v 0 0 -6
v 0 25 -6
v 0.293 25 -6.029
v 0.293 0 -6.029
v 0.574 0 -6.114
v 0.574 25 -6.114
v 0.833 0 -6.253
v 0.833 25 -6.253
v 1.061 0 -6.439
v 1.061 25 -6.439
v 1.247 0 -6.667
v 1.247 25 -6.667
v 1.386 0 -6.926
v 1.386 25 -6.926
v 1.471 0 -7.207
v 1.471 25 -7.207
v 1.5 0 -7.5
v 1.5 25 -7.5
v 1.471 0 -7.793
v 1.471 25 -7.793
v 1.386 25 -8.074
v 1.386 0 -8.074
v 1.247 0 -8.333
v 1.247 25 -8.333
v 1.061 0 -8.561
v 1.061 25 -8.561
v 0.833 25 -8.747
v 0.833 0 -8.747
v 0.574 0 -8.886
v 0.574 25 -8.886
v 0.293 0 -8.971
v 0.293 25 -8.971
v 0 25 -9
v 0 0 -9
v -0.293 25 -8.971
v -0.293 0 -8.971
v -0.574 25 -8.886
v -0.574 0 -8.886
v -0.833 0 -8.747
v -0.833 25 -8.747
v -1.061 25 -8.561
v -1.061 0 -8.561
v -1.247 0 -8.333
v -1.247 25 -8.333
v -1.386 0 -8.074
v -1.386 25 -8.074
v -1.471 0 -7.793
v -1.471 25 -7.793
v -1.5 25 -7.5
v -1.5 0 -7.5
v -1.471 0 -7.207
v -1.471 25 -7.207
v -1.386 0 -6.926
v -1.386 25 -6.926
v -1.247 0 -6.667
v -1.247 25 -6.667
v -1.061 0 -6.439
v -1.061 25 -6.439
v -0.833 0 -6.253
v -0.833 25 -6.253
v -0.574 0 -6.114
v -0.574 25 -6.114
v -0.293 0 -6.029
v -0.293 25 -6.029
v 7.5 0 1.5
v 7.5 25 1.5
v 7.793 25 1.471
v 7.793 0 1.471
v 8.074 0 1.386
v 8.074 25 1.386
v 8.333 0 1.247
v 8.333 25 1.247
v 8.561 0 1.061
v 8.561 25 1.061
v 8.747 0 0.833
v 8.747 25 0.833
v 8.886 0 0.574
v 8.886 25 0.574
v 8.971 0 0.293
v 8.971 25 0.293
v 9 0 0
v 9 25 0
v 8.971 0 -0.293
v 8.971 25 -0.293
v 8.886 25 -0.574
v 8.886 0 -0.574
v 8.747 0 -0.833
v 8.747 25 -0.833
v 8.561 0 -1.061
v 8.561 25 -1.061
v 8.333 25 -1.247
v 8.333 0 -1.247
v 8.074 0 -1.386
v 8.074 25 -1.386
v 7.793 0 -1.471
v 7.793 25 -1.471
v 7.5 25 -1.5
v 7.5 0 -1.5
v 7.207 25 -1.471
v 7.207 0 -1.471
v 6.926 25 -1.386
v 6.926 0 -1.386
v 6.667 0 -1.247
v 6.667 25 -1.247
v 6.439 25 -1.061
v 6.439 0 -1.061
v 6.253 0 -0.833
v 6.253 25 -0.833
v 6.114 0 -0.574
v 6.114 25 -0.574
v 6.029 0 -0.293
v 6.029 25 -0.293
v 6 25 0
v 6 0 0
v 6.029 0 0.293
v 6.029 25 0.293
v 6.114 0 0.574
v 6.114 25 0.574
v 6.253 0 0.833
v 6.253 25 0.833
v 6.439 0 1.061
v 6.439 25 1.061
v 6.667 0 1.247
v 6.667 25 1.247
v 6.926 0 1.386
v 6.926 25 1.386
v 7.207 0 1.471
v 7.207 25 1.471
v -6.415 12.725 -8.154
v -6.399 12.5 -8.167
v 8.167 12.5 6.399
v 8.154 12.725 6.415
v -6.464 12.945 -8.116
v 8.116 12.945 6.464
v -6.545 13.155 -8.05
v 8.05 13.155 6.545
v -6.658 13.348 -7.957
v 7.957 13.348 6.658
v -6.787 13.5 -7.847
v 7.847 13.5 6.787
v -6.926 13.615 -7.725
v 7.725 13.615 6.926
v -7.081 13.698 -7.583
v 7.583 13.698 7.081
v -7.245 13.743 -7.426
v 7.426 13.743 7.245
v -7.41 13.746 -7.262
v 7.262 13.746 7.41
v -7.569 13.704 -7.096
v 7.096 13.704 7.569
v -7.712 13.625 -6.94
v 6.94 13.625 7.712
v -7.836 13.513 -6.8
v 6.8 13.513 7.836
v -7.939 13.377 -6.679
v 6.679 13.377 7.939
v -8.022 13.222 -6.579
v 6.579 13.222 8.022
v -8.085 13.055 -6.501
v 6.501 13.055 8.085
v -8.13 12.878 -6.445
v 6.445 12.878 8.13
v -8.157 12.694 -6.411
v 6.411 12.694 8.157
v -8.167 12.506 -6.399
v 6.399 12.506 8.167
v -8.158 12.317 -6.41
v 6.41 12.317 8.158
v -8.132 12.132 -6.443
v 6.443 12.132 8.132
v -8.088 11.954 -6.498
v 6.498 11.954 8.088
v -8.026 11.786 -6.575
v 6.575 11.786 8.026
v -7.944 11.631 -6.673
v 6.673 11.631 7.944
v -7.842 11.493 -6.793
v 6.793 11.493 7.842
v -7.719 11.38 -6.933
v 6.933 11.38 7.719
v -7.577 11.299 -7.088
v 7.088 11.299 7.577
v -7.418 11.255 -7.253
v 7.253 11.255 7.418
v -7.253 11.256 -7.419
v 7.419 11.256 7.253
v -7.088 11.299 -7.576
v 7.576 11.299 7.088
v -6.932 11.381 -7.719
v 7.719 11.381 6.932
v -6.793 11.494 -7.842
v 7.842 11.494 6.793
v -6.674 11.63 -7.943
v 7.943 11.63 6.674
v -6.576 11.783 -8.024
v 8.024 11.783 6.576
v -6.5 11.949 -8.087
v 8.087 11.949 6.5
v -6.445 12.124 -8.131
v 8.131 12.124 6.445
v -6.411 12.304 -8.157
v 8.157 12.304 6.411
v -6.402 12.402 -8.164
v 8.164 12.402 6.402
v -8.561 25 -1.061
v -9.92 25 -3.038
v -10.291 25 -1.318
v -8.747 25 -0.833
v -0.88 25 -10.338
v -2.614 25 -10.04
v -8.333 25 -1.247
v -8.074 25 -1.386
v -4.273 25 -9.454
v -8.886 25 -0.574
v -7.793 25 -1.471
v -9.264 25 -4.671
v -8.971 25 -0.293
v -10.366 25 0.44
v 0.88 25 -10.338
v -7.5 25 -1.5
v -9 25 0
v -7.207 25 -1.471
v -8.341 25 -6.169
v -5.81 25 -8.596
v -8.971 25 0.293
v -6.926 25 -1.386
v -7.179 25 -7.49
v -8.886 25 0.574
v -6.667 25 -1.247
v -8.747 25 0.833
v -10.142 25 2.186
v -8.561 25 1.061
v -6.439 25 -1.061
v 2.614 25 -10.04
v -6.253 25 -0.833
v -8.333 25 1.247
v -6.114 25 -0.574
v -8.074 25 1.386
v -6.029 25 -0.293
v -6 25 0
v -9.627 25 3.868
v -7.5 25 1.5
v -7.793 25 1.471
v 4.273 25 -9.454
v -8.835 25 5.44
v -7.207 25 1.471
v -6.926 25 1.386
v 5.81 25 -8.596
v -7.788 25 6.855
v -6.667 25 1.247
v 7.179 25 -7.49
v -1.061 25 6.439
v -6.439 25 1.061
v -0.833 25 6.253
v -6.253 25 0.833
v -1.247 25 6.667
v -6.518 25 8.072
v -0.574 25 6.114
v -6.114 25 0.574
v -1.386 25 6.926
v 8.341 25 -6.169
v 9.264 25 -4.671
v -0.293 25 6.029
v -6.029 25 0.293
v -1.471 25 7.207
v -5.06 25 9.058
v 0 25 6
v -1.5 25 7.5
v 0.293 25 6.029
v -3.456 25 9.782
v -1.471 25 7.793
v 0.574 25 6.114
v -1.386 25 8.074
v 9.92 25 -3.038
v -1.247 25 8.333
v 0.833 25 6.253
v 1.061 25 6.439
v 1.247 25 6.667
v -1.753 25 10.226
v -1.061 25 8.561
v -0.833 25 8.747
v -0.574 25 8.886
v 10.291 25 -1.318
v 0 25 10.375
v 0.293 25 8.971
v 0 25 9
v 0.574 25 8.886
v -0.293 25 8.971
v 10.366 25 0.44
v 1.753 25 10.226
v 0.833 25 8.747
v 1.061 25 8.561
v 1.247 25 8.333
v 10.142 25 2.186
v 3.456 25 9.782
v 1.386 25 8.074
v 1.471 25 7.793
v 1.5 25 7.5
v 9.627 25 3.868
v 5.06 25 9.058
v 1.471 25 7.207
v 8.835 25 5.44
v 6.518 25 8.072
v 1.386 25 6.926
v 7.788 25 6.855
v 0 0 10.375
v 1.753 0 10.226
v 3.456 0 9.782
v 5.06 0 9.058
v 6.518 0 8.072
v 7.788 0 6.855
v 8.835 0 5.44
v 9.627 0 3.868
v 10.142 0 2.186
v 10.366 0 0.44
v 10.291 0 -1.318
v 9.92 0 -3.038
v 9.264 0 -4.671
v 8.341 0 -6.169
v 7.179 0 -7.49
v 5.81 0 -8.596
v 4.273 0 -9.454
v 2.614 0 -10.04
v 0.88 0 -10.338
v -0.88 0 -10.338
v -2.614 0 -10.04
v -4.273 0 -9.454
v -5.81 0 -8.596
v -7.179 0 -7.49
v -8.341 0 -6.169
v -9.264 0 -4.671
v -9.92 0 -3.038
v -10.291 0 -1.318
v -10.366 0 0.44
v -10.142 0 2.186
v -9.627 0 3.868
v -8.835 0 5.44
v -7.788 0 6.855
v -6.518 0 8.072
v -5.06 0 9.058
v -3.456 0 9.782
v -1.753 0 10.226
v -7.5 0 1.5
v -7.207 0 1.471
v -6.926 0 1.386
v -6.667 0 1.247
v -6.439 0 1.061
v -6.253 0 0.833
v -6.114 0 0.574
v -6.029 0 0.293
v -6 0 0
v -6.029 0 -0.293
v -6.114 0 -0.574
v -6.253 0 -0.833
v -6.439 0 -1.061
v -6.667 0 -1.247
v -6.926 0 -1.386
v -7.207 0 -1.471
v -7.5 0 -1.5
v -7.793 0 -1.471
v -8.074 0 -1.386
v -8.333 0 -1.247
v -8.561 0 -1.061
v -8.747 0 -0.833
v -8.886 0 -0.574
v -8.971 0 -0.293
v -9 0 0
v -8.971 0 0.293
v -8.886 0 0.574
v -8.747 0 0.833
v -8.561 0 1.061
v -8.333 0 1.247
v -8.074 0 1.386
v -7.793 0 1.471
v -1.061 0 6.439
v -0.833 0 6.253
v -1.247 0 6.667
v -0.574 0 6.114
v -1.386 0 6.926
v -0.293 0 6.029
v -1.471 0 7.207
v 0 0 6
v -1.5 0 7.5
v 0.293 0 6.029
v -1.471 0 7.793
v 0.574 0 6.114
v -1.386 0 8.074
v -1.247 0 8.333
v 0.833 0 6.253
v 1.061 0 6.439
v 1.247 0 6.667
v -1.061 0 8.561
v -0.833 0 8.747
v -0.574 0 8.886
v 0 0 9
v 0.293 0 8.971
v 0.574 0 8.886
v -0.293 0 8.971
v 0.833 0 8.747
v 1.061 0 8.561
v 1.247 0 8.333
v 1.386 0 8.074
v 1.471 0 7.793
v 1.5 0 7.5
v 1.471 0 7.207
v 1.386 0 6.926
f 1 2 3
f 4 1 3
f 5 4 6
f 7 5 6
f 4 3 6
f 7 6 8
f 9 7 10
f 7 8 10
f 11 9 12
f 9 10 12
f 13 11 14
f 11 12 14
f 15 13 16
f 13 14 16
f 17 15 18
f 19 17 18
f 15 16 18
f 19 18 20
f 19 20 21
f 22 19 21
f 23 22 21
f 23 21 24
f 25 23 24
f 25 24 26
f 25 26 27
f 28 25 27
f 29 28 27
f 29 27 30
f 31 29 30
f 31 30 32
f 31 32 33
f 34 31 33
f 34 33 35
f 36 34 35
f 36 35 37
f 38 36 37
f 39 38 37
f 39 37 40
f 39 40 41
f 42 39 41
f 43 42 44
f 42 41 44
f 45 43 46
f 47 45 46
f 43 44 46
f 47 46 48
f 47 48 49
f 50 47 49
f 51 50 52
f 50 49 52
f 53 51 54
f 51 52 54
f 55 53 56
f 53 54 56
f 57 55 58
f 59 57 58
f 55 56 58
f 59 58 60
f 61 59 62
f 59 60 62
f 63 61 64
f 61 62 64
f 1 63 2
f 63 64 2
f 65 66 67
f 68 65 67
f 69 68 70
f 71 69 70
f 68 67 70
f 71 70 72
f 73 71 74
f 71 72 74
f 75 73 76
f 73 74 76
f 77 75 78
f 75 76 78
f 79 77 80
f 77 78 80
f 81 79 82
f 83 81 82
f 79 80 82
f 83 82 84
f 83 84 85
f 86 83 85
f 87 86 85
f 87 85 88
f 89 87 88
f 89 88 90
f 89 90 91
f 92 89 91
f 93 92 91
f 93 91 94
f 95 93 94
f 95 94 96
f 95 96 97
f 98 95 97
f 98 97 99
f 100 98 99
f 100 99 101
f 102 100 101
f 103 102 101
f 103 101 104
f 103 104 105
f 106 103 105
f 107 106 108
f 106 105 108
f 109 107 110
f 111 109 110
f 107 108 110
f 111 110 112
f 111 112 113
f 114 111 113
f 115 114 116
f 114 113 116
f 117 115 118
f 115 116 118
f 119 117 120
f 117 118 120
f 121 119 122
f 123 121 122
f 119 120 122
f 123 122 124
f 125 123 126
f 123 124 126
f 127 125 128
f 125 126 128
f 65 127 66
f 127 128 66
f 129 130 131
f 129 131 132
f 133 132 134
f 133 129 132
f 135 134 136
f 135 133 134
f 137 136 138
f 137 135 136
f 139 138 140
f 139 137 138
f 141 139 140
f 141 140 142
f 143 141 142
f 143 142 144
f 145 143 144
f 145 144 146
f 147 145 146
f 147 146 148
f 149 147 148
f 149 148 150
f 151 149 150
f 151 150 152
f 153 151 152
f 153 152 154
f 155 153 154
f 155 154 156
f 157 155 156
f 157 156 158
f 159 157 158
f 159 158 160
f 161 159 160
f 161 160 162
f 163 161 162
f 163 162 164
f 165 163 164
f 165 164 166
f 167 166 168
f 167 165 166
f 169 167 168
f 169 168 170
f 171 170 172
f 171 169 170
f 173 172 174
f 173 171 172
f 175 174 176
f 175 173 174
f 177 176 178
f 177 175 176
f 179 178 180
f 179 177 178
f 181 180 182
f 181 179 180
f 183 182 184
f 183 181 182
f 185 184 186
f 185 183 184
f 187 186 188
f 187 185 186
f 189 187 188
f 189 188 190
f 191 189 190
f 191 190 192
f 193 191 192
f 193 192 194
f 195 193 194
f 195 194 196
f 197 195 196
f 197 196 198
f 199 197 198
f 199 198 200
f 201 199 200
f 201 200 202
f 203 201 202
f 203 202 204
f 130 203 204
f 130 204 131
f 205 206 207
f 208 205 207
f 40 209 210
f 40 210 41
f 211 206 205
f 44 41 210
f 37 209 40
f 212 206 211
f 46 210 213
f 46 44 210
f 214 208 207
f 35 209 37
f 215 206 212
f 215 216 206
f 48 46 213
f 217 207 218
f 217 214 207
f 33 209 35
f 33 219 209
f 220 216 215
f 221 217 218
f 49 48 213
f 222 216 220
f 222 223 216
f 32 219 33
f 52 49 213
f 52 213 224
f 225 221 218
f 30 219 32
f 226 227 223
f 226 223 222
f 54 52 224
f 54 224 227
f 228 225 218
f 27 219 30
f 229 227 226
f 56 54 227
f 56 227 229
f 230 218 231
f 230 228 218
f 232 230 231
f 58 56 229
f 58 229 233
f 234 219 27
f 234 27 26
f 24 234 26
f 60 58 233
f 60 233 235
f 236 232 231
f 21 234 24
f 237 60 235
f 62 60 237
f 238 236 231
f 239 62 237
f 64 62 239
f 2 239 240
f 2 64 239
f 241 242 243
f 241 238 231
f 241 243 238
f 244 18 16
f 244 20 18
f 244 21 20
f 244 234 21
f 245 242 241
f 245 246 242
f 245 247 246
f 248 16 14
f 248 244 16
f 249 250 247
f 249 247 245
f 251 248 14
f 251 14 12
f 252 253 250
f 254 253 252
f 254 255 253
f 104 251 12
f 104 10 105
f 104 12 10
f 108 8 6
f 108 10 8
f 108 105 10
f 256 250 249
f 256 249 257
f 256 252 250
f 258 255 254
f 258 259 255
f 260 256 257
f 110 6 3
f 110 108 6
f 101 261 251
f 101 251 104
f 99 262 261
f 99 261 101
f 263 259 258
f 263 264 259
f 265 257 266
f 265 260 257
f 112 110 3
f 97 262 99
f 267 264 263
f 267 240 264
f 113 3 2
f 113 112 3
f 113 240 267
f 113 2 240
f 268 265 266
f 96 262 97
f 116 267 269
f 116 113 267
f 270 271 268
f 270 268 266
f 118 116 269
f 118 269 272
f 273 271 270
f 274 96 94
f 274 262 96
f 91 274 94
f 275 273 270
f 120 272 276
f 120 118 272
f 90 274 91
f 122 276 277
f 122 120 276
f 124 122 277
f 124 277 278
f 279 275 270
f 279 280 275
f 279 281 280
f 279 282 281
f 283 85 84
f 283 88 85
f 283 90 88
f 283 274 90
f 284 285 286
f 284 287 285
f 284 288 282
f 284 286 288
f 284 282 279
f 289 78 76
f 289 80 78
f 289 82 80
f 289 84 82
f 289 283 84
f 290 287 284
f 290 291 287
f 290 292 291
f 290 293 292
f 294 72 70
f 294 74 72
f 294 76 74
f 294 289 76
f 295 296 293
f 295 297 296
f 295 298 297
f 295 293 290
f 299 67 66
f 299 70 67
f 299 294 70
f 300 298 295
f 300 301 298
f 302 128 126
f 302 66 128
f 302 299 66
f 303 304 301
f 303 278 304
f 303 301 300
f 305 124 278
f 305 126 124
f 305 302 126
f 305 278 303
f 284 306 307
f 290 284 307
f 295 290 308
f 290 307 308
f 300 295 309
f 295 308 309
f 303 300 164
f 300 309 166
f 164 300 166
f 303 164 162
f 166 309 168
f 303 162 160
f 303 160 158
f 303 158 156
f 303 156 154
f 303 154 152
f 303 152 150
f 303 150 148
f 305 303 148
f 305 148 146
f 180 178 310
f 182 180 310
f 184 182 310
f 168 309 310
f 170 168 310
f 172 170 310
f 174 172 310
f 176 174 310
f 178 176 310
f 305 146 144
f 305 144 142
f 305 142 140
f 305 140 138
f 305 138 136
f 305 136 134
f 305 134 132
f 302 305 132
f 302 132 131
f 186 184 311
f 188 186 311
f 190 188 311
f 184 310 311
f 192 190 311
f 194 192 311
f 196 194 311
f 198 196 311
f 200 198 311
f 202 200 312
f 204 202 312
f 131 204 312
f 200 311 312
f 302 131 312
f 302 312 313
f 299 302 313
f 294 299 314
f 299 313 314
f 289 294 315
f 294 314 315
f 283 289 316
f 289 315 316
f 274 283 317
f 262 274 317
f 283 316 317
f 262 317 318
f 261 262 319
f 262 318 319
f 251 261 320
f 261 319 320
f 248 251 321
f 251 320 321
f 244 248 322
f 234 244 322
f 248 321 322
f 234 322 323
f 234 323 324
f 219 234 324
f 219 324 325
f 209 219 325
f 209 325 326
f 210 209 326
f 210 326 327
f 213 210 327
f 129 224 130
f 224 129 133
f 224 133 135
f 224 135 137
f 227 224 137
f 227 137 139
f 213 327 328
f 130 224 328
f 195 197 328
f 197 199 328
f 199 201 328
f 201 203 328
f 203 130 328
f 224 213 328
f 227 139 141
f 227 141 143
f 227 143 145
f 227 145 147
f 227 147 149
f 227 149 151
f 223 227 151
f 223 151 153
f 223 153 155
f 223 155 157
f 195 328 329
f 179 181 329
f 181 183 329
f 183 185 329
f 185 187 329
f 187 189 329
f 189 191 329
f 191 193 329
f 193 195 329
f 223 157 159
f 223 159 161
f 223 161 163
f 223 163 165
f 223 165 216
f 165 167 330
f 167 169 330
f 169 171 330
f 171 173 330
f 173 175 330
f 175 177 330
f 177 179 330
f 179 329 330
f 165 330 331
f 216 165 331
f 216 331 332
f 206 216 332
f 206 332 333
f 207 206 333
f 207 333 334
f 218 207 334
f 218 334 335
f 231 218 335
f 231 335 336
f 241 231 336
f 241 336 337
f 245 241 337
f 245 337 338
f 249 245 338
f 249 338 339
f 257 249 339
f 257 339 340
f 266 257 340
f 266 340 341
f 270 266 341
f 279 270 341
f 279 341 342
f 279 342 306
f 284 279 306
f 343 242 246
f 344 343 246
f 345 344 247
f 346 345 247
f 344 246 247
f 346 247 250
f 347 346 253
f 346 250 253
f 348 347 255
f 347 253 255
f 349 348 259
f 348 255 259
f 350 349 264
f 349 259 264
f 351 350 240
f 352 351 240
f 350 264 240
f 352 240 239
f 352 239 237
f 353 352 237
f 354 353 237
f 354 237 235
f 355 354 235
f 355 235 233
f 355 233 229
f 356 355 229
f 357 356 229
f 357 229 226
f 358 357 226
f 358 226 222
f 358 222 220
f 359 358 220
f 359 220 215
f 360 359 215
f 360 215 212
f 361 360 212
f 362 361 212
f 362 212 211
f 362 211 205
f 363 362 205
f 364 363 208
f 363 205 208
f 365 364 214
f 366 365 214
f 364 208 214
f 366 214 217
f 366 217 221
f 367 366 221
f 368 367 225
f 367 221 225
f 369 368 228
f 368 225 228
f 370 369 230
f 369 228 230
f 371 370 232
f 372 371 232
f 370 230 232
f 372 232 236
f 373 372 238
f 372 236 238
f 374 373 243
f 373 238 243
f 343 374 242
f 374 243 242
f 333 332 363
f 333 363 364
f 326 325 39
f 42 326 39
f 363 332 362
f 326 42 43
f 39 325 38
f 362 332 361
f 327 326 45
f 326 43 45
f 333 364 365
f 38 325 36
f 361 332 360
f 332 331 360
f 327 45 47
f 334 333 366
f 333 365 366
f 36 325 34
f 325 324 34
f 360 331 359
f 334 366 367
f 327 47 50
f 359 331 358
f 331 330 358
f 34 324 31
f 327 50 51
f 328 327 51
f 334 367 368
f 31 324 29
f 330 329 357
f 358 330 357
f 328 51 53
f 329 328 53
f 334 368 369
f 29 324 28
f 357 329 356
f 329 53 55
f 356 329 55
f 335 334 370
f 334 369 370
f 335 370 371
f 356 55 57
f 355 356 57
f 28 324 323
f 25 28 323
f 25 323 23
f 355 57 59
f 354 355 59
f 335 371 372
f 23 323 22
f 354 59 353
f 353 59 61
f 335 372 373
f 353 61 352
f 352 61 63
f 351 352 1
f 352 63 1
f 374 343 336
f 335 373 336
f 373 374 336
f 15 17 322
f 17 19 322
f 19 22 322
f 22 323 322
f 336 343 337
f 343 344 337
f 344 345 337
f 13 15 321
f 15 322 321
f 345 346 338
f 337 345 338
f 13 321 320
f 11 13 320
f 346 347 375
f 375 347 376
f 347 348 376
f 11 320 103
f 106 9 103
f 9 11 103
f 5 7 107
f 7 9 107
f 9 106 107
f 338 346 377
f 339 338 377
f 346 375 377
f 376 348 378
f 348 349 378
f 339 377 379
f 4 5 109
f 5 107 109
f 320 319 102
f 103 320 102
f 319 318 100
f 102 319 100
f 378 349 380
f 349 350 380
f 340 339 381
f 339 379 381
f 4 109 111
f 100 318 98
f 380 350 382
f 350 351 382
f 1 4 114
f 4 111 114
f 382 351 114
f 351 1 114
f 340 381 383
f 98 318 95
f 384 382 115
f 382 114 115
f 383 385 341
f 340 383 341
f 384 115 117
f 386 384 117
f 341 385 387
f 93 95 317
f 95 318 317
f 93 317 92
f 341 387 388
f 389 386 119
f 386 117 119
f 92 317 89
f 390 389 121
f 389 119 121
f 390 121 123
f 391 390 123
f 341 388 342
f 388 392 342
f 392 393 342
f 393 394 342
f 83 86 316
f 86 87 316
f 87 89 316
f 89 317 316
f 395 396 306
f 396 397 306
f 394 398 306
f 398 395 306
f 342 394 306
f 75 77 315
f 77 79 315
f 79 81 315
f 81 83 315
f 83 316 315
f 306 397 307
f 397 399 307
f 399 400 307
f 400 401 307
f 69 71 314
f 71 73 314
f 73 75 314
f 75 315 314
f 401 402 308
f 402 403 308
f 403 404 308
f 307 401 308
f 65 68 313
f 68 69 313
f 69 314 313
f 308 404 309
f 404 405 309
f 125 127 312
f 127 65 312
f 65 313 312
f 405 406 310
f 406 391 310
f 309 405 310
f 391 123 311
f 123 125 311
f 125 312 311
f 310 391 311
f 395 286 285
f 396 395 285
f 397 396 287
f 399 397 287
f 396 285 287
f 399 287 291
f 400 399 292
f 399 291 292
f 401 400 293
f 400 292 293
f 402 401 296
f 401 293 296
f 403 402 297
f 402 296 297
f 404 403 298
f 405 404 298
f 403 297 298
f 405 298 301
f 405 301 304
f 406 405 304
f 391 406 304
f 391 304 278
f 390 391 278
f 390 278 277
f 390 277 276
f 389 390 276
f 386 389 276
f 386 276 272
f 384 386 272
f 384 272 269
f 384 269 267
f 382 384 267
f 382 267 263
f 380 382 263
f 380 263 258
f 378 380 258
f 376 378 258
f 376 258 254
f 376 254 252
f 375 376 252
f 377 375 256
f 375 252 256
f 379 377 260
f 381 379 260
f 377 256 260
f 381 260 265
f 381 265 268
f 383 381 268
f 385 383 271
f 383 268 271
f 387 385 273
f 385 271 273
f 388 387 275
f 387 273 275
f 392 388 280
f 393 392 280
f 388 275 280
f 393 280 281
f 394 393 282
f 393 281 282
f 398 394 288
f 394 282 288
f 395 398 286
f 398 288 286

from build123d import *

# Parameters (mm, degrees)
SKETCH_1_R               = 10.375
EXTRUDE_1_DEPTH          = 25
SKETCH_2_R               = 1.5
CUT_EXTRUDE_1_DEPTH      = 29.98760511
CUT_EXTRUDE_2_DEPTH      = 29.98760511
CUT_EXTRUDE_2_DEPTH_BACK = 29.98760511
SKETCH_3_R               = 1.25


with BuildPart() as part:
    # 草图1 → 凸台-拉伸1 (new body)
    with BuildSketch(Plane(origin=(0, 0, 0), x_dir=(1, 0, 0), z_dir=(0, 1, 0))):
        Circle(SKETCH_1_R)
    extrude(amount=EXTRUDE_1_DEPTH)

    # 草图2 → 切除-拉伸1 (cut, through all)
    with BuildSketch(Plane(origin=(0, 25, 0), x_dir=(1, 0, 0), z_dir=(0, 1, 0))):
        with Locations((0, 7.5)):
            Circle(SKETCH_2_R)
        with Locations((-7.5, 0)):
            Circle(SKETCH_2_R)
        with Locations((7.5, 0)):
            Circle(SKETCH_2_R)
        with Locations((0, -7.5)):
            Circle(SKETCH_2_R)
    extrude(amount=-CUT_EXTRUDE_1_DEPTH, mode=Mode.SUBTRACT)

    # 草图3 → 切除-拉伸2 (cut, two sides: drawn at the far end of the back side and taken through both)
    with BuildSketch(Plane(origin=(0, 0, 0), x_dir=(0, 1, 0), z_dir=(0.7071067811865488, 0, 0.7071067811865464)).offset(-CUT_EXTRUDE_2_DEPTH_BACK)):
        with Locations((12.5, 0)):
            Circle(SKETCH_3_R)
    extrude(amount=CUT_EXTRUDE_2_DEPTH + CUT_EXTRUDE_2_DEPTH_BACK, mode=Mode.SUBTRACT)


solid = part.part
